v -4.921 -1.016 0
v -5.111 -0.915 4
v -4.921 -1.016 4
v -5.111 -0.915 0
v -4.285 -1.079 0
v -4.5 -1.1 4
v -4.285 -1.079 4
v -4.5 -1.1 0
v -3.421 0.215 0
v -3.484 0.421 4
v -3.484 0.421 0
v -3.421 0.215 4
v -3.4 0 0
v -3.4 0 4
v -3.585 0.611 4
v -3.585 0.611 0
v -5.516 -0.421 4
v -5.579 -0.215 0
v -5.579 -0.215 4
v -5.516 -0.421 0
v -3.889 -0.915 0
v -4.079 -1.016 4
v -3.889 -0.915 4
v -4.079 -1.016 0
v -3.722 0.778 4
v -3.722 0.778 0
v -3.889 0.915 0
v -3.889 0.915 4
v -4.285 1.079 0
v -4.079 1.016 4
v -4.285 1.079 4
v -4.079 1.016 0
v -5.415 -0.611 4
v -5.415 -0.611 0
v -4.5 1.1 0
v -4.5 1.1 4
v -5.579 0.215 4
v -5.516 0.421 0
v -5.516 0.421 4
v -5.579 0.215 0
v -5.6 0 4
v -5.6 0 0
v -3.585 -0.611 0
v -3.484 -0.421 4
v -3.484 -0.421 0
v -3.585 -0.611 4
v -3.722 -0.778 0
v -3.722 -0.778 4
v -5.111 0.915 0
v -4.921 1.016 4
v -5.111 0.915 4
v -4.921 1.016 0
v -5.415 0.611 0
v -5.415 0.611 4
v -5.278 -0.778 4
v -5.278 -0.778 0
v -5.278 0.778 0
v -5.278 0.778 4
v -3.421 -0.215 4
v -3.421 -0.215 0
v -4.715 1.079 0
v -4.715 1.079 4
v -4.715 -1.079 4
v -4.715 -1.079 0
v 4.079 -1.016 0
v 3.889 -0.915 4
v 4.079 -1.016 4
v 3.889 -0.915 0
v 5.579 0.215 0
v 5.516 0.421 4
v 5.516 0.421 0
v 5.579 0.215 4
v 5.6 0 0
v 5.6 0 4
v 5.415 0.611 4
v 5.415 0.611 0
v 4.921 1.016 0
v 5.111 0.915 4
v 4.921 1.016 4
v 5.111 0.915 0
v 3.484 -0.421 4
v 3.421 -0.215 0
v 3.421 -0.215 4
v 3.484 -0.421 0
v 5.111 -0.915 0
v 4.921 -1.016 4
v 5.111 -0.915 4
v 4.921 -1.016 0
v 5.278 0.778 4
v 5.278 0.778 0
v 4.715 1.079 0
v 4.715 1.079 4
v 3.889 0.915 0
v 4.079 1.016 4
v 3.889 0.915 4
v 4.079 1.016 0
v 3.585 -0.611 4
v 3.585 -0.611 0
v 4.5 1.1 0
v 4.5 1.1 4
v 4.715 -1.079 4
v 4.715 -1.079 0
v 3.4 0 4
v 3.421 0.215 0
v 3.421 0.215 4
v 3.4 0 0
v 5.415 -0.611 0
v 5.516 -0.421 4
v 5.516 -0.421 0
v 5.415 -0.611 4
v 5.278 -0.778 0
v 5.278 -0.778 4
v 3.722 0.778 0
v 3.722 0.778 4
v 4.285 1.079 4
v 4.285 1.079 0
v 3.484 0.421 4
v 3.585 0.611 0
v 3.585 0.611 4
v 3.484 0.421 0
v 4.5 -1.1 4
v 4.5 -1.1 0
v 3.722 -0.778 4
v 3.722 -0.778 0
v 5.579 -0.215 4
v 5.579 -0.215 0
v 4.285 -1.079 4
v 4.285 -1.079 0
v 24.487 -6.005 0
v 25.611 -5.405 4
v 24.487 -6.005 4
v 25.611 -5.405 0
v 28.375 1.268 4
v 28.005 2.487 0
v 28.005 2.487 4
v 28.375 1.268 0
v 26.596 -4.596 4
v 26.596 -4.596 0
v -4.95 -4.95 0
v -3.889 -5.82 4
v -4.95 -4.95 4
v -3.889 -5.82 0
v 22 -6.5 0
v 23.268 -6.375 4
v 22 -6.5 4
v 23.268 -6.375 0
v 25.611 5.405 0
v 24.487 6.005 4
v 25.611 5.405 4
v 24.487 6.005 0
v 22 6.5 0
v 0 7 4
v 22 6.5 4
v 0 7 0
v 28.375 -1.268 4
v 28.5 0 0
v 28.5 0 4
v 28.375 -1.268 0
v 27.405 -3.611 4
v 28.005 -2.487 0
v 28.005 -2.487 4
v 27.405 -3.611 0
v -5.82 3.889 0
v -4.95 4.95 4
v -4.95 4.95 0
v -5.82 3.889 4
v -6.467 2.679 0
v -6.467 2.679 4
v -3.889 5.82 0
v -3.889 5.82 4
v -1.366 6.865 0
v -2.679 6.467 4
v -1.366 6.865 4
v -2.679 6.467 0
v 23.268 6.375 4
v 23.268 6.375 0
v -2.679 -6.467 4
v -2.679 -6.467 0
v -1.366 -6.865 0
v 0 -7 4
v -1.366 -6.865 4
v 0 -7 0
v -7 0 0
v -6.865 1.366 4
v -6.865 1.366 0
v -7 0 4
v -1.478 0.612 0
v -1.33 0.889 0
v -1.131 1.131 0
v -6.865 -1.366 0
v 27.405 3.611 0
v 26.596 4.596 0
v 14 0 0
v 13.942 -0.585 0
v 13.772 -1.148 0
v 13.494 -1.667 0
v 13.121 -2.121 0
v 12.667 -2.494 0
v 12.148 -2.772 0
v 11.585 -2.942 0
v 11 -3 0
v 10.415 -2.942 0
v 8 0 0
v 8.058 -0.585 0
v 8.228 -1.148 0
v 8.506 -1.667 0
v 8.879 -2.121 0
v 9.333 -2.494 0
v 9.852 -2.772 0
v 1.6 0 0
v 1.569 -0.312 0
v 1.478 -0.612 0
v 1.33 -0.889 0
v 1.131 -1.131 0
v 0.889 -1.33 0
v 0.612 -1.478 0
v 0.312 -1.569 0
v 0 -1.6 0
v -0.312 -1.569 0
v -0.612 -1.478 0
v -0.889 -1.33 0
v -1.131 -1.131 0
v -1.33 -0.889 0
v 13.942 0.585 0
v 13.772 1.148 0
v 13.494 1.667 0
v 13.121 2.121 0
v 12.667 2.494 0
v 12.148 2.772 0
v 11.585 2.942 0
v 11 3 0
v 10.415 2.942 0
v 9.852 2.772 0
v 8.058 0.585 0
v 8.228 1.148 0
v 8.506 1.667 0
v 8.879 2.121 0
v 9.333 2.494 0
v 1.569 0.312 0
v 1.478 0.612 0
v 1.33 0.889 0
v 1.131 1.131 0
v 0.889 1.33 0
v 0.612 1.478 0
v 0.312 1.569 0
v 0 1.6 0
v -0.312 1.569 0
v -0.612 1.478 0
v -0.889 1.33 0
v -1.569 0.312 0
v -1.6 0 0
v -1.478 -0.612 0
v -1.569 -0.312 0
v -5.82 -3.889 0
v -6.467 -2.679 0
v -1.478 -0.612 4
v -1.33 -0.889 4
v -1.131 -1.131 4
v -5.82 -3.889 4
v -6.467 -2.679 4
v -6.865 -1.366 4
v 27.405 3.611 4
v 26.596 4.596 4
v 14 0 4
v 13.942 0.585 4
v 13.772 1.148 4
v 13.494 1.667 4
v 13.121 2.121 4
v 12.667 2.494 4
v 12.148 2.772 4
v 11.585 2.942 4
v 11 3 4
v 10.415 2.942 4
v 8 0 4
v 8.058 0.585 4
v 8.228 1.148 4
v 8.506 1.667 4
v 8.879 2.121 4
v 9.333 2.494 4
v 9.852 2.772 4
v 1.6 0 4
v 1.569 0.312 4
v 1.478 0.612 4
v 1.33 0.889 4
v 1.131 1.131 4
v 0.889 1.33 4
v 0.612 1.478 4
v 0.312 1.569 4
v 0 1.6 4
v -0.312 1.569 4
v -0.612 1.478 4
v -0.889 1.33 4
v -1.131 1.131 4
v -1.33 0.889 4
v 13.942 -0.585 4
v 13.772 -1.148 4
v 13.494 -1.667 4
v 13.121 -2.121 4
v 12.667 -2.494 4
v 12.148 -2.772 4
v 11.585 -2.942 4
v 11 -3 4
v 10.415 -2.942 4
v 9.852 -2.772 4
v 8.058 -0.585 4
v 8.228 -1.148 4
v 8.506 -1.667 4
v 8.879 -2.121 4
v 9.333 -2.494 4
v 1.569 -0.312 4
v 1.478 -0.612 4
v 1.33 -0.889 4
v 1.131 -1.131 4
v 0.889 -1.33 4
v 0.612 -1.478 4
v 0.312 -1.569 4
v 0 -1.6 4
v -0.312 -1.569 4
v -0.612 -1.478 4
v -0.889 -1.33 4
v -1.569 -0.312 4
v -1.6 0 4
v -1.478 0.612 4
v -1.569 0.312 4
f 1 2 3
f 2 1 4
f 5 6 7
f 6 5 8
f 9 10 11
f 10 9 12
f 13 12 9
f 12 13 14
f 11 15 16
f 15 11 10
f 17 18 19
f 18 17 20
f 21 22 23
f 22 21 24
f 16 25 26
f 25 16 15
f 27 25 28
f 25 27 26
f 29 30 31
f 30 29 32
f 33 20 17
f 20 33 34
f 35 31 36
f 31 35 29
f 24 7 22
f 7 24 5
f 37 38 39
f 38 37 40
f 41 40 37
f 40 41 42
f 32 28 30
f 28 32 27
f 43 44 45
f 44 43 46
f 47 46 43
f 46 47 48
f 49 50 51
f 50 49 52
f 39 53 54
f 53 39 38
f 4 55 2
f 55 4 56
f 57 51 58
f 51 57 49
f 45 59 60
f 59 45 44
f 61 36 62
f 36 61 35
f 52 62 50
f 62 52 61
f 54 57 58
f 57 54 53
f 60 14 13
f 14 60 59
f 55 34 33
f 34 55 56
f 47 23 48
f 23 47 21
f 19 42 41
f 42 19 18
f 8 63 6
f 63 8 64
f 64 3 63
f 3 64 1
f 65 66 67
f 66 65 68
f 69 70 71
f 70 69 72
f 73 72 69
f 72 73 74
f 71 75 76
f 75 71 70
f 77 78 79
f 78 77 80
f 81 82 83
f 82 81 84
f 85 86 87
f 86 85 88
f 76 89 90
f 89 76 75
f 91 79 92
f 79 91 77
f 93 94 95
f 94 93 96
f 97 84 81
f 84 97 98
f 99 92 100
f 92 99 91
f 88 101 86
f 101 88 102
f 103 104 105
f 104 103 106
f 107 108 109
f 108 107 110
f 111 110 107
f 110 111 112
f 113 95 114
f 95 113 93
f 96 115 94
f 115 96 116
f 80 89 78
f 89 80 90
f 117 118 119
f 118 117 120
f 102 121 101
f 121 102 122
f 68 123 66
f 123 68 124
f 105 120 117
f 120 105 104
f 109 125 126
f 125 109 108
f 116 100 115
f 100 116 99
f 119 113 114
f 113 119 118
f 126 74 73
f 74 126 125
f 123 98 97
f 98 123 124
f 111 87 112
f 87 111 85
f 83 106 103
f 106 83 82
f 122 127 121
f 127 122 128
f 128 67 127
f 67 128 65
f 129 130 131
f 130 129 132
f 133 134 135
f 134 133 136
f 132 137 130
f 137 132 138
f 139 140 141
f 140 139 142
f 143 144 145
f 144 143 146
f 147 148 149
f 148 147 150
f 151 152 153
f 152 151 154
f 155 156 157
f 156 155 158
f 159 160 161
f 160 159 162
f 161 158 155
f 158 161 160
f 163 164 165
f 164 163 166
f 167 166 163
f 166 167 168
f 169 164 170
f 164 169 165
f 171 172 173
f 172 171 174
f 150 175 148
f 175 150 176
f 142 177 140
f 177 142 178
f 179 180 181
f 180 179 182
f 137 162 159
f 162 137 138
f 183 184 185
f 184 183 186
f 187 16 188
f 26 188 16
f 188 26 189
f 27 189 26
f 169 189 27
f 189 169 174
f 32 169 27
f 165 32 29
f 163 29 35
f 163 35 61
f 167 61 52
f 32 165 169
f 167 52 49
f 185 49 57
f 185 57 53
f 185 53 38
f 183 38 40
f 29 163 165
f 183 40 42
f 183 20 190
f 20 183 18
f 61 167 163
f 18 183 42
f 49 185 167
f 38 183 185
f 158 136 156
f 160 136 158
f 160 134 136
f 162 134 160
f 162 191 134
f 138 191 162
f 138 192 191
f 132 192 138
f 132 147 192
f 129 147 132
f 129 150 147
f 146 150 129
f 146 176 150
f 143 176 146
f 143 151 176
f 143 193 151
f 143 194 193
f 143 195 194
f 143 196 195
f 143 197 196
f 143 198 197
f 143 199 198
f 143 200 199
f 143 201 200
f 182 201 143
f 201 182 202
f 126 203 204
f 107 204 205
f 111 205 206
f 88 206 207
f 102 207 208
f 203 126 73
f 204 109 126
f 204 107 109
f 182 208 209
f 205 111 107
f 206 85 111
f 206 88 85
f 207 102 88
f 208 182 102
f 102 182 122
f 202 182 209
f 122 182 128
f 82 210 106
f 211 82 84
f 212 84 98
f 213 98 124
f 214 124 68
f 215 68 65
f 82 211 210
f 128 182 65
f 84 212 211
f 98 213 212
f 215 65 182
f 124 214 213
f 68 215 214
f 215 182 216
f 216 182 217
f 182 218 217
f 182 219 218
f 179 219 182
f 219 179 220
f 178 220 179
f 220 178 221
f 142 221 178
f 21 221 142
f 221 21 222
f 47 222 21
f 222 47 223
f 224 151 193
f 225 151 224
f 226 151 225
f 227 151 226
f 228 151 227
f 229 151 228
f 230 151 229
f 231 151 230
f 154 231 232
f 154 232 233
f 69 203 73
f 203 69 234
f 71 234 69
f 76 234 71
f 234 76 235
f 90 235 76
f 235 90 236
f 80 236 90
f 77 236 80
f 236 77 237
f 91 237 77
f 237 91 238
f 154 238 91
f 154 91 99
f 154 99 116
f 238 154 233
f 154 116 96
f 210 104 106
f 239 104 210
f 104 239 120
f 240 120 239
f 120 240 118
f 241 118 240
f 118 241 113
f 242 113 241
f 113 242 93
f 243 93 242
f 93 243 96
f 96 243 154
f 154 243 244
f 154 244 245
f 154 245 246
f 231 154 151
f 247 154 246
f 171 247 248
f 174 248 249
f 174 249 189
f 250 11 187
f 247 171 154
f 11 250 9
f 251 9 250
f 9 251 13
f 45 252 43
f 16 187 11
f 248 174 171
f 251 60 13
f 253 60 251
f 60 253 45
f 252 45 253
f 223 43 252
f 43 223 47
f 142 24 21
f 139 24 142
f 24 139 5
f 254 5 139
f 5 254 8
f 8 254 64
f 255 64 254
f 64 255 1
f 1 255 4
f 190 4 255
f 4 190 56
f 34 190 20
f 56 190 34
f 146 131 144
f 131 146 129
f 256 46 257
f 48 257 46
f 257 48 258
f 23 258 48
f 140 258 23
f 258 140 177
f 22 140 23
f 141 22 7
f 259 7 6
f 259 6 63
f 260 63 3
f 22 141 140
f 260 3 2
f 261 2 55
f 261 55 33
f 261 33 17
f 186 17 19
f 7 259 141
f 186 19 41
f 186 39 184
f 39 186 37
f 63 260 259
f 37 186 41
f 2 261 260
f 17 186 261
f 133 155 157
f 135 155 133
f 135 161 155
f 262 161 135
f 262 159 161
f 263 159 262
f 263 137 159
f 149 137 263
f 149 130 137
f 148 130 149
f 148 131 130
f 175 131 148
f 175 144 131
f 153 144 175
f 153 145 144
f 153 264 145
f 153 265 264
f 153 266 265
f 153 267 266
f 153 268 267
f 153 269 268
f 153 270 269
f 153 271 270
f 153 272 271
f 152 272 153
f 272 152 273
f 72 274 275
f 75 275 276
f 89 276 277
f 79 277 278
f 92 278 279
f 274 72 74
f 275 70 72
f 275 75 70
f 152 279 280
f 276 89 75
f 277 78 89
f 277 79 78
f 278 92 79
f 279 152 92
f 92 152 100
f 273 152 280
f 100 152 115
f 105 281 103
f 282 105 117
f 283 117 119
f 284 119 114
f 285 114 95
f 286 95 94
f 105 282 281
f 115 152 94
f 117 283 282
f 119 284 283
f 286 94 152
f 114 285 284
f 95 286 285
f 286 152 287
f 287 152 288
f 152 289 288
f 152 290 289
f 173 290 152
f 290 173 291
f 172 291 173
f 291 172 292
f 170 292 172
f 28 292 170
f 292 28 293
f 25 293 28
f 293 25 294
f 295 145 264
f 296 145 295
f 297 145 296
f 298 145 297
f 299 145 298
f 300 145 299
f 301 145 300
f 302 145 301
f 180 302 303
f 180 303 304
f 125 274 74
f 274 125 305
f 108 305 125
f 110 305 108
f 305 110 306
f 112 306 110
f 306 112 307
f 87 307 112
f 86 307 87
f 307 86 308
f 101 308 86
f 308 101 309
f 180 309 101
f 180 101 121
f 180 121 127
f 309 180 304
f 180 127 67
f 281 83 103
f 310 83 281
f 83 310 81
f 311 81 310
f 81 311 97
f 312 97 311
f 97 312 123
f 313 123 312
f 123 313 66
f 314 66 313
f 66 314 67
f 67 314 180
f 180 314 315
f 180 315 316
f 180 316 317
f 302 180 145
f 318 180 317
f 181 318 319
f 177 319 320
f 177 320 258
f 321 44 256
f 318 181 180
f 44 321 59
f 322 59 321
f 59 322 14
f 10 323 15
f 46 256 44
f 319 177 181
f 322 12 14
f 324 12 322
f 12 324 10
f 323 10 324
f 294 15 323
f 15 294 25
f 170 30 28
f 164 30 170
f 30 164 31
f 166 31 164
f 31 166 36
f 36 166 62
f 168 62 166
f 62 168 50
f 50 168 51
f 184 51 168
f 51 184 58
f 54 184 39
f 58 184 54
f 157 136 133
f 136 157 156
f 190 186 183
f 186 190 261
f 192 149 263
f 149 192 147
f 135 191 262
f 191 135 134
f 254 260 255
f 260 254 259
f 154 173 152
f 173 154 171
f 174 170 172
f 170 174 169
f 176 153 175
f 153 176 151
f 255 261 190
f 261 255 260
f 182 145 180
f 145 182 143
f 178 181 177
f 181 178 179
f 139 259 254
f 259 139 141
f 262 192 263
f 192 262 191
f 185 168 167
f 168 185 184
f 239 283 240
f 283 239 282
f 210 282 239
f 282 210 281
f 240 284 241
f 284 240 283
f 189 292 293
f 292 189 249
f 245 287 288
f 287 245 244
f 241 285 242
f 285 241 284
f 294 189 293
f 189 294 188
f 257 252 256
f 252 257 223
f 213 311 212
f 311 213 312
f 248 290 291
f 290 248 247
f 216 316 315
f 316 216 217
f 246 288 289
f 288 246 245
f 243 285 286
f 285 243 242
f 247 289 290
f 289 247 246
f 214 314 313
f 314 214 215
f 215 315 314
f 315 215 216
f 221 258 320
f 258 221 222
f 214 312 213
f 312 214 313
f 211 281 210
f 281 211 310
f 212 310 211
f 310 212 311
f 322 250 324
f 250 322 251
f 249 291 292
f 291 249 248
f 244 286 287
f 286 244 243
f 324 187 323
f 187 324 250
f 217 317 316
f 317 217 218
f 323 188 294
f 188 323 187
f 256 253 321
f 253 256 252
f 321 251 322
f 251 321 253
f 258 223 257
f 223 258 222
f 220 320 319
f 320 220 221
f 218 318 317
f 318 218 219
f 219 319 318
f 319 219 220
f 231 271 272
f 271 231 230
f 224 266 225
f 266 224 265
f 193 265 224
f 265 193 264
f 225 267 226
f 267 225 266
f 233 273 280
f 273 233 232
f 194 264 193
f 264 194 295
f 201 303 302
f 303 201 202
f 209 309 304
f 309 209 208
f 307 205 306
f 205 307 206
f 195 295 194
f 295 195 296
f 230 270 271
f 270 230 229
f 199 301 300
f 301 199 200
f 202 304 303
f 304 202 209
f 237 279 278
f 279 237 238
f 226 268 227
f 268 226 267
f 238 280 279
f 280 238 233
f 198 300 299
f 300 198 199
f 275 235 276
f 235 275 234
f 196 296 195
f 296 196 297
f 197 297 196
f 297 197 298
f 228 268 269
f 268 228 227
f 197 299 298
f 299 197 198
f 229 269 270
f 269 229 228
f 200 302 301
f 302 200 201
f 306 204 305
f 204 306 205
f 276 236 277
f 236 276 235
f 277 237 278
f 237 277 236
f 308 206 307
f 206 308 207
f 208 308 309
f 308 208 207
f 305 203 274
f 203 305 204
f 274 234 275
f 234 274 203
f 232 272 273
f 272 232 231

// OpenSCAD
// pusher_arm.scad - pusher arm for the light-switch pusher (Issue #7).
//
// Flat printed arm that clamps over the stock servo horn (the spline is
// not printed). The hub sits on the servo shaft; the wide tip pad presses
// the rocker. Print flat as modelled (thickness along Z).
//
// Units: mm. See docs/LIGHT_SWITCH.md for the stroke budget: with the
// default arm_len = 22 and a 55 deg swing, tip travel toward the wall is
// about 9.7 mm.
//
// Render status: no CAD kernel was available in the build environment;
// open in OpenSCAD and check the preview before slicing.

// ---- Parameters ----
arm_len = 22;      // hub centre to tip-pad centre (effective length)
thickness = 4;     // arm thickness
hub_r = 7;         // hub disc radius
mid_r = 5;         // arm radius near the hub
tip_r = 6.5;       // tip pad radius (wider, flat contact)

$fn = 32;

module arm() {
  difference() {
    // Body: hub disc blended into the arm and the tip pad.
    hull() {
      cylinder(h = thickness, r = hub_r);
      translate([arm_len, 0, 0]) cylinder(h = thickness, r = tip_r);
    }
    // Centre hole for the horn screw.
    translate([0, 0, -1]) cylinder(h = thickness + 2, r = 1.6);
    // Two holes matching the stock horn's screw positions.
    for (sx = [-1, 1])
      translate([sx * 4.5, 0, -1]) cylinder(h = thickness + 2, r = 1.1);
    // Lightening hole in the arm.
    translate([arm_len / 2, 0, -1]) cylinder(h = thickness + 2, r = 3);
  }
}

arm();
